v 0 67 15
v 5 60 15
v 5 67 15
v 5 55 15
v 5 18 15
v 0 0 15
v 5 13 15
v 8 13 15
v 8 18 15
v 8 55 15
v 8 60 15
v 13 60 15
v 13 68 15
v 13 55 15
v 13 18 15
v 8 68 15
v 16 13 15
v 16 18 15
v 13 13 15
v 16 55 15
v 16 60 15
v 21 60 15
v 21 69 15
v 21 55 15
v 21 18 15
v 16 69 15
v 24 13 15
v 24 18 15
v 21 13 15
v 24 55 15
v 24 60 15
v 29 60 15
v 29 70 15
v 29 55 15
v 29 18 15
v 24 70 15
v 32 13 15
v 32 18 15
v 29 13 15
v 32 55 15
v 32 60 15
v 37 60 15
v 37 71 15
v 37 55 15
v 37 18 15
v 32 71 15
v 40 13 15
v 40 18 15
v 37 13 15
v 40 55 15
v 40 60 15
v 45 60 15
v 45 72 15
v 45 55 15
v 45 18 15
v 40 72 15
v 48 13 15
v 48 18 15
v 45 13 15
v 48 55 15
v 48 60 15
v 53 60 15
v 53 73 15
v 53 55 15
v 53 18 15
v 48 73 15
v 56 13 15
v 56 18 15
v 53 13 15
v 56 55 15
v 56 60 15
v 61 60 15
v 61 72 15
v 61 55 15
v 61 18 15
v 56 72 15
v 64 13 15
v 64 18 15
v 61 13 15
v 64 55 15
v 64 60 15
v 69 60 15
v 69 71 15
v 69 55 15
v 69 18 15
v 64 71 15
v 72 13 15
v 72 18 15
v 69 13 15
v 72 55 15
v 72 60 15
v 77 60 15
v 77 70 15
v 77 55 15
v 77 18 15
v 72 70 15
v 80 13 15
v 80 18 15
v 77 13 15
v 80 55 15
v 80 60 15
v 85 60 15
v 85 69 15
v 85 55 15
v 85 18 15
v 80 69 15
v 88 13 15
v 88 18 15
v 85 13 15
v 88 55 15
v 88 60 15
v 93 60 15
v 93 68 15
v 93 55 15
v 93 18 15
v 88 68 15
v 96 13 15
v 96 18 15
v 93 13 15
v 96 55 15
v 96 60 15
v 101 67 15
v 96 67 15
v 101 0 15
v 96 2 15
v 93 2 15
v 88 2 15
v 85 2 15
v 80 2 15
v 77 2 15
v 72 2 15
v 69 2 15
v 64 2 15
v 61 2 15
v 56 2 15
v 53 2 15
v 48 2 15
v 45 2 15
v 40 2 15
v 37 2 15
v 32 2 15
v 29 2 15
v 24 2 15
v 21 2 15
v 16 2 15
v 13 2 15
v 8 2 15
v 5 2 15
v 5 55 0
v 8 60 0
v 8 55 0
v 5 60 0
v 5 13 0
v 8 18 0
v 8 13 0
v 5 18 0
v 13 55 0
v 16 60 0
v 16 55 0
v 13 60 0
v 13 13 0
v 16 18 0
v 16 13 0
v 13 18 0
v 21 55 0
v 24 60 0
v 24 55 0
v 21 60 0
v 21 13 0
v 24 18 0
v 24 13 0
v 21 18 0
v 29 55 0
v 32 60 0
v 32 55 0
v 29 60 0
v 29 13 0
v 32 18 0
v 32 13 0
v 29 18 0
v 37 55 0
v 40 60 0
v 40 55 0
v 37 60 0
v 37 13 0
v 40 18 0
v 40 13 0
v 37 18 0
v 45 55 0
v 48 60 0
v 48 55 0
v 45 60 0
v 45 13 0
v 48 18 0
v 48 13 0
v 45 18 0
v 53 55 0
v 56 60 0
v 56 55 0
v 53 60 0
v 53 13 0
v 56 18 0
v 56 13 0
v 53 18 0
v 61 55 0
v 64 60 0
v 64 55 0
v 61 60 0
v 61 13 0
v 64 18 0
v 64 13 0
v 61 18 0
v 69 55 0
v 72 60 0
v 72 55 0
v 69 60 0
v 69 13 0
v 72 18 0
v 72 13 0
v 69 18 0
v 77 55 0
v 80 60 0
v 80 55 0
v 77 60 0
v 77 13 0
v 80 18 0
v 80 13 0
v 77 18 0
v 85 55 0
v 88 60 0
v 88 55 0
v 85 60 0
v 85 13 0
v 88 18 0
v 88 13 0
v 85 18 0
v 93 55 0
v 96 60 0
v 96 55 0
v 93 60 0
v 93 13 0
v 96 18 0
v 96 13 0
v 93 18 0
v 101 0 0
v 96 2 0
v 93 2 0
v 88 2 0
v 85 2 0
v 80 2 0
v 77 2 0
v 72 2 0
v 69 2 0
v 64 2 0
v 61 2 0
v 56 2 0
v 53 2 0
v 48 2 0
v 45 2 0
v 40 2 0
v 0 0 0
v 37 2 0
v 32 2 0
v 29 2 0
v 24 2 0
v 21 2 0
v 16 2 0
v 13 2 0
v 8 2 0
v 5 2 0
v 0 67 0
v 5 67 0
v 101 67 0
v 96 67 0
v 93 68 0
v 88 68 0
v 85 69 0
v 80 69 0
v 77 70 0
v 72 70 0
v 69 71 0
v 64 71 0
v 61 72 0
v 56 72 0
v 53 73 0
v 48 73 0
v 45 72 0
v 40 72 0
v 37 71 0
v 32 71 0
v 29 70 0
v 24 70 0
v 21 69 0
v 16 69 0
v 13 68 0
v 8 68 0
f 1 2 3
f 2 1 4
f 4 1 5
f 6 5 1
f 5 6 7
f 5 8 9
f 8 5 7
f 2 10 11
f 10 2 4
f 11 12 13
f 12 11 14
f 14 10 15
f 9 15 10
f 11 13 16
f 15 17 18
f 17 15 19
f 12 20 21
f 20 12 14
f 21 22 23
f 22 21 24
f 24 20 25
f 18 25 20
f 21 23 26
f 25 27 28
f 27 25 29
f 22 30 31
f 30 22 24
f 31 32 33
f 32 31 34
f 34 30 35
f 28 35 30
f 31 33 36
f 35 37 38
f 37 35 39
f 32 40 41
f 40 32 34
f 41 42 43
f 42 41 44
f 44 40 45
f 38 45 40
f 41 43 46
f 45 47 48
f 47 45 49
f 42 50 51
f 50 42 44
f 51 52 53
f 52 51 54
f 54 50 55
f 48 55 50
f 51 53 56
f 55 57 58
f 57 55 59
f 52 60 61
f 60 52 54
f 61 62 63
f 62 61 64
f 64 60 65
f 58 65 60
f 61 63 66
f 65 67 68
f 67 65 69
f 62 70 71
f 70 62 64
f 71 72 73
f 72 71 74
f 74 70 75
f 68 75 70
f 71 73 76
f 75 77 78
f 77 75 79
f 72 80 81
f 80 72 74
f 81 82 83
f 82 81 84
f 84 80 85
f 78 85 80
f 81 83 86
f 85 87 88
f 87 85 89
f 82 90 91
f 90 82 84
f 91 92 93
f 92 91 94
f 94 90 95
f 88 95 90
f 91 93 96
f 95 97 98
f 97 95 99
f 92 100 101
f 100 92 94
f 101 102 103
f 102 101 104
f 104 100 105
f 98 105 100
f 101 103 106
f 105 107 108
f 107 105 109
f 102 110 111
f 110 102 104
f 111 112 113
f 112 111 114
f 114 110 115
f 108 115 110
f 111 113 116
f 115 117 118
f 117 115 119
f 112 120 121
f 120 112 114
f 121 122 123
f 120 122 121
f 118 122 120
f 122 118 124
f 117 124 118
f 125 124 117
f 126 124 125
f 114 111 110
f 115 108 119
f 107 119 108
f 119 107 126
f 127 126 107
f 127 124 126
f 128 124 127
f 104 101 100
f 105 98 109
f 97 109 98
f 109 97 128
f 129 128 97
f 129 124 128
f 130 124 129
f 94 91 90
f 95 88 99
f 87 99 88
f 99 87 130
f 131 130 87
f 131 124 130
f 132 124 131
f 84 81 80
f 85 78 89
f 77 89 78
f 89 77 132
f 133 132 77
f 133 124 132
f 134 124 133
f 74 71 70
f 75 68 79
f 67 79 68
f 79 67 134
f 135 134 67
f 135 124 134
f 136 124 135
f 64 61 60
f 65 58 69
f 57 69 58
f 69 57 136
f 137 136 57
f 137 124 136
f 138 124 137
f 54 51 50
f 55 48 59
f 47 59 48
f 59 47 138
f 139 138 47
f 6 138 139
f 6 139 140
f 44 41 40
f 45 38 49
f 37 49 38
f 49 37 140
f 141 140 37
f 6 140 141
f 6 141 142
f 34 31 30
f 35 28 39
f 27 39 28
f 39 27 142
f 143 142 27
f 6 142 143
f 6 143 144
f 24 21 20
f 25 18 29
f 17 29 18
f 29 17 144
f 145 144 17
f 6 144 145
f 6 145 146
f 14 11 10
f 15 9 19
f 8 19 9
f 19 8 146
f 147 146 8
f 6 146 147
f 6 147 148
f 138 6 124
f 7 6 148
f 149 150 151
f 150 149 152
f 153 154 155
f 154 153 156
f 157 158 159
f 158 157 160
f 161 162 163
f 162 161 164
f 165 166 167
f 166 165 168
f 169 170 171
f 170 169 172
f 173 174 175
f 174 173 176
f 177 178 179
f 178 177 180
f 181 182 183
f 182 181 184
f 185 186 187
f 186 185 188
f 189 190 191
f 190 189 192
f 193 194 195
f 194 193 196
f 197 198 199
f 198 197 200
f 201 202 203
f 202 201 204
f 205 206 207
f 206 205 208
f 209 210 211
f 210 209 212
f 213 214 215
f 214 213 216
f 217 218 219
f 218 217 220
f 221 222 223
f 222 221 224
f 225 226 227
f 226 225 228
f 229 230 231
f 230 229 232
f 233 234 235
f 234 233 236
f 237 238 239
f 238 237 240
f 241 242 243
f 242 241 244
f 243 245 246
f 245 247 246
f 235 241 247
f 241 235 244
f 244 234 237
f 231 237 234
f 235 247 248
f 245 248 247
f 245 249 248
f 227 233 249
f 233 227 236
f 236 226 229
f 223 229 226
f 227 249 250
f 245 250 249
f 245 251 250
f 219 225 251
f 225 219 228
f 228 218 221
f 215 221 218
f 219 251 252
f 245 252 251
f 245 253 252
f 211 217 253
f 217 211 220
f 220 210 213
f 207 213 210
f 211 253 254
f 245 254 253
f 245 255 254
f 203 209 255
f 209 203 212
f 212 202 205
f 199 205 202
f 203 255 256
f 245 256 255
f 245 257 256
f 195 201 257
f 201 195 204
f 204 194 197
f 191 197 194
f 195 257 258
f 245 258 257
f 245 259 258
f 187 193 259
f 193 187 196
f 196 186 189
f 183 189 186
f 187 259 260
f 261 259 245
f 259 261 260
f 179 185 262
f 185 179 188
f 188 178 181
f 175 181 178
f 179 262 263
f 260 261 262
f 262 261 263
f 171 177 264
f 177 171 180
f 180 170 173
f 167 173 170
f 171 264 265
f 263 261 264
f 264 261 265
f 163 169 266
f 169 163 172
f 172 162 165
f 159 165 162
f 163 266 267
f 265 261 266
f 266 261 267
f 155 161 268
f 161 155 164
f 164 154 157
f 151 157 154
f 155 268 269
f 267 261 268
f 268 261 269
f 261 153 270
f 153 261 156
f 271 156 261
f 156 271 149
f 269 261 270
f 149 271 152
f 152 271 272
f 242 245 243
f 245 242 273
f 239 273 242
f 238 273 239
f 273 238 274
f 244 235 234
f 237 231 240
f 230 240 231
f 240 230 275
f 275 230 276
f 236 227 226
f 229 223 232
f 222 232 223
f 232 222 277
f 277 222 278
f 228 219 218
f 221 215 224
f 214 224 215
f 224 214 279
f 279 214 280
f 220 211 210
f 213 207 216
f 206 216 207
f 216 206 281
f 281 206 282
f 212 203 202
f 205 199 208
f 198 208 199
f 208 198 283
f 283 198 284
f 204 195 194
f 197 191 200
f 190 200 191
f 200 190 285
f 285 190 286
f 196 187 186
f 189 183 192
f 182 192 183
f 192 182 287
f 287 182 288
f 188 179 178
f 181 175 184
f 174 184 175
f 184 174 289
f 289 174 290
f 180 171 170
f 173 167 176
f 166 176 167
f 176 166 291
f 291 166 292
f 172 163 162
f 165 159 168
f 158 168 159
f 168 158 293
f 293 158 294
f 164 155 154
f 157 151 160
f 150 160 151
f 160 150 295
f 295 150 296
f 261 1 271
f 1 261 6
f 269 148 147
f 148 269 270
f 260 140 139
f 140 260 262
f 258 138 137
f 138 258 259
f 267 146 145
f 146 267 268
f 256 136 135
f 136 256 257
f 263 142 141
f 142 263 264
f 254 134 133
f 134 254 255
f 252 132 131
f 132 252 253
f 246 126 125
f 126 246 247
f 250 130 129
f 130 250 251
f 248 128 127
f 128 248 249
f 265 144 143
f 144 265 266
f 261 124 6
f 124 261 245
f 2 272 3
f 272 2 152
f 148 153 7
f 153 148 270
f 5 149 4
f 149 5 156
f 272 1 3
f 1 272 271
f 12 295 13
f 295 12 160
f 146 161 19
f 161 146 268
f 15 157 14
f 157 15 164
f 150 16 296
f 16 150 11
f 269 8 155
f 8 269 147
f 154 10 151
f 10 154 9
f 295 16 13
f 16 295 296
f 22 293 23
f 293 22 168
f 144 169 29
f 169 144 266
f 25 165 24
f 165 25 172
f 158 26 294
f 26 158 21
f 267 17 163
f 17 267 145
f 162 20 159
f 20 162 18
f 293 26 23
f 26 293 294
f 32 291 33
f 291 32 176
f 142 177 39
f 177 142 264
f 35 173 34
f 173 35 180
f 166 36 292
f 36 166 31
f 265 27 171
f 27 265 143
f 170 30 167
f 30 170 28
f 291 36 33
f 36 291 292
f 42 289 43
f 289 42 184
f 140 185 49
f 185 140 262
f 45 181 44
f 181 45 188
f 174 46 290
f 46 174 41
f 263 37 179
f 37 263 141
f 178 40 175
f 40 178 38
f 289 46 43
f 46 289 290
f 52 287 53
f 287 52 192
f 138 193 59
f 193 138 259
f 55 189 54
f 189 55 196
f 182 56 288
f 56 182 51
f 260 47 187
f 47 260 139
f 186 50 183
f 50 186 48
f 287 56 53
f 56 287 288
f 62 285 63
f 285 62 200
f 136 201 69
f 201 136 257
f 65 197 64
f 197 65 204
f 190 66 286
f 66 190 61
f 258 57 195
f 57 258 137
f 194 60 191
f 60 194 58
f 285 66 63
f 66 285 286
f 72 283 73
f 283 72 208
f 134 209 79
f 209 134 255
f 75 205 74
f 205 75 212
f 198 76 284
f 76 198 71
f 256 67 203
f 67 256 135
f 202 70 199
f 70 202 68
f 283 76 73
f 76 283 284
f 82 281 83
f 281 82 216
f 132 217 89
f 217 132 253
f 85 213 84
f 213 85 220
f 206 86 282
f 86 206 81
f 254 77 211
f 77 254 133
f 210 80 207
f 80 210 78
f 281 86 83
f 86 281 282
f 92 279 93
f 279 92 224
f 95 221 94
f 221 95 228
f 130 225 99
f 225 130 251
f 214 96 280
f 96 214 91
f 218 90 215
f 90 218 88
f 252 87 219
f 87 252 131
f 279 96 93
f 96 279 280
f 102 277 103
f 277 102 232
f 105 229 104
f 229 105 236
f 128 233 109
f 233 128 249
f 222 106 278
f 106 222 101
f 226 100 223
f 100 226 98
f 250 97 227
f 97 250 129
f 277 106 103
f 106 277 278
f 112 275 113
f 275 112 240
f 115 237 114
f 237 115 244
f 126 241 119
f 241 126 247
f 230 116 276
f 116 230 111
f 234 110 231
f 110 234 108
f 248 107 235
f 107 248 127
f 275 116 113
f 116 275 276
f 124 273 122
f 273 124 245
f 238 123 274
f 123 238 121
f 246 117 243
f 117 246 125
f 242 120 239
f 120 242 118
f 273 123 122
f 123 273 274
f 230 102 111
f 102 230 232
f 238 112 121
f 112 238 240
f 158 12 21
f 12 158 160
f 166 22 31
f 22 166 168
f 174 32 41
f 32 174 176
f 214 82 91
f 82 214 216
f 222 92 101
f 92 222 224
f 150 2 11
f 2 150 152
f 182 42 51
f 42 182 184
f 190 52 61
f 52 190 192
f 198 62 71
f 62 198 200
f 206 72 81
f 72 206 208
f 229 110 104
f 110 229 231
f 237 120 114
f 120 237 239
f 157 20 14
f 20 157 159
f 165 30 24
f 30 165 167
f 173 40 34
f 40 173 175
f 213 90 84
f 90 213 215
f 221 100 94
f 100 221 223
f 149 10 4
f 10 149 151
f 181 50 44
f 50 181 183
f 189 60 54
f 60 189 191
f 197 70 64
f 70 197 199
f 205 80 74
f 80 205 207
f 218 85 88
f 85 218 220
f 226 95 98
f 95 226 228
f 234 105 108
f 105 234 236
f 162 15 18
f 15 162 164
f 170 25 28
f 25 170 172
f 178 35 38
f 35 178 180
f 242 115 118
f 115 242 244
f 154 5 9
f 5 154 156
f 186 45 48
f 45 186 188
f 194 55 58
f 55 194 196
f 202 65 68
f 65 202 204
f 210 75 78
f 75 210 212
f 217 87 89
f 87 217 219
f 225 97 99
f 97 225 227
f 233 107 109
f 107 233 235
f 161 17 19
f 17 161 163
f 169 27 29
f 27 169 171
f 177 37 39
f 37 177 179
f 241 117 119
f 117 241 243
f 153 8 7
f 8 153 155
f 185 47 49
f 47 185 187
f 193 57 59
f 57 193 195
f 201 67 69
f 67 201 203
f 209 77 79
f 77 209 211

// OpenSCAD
// Забор by @Karimov_Sheroz

cube([100, 2, 15]); color([0.1,0.4,0])  // параллелепипед со сторонами 100,2,15  мм
cube([100, 2, 15]); color([0.1,0.4,0])  // параллелепипед со сторонами 100,2,15  мм  
  translate([0,0,0]) cube([5, 67, 15]); color([0.56,0.23,0])  // параллелепипед со сторонами 5, 67, 15  мм
translate([8,0,0]) cube([5, 68, 15]); color([0.56,0.23,0])  //параллелепипед со сторонами 5, 68, 15  мм
translate([16,0,0]) cube([5, 69, 15]); color([0.56,0.23,0])  // параллелепипед со сторонами 5, 69, 15  мм 
translate([24,0,0]) cube([5, 70, 15]); color([0.56,0.23,0])  // параллелепипед со сторонами 5, 70, 15  мм  
translate([32,0,0]) cube([5, 71, 15]); color([0.56,0.23,0])   //параллелепипед со сторонами 5, 71, 15  мм
  translate([40,0,0]) cube([5, 72, 15]); color([0.56,0.23,0])   //параллелепипед со сторонами 5, 72, 15  мм
translate([48,0,0]) cube([5, 73, 15]); color([0.56,0.23,0])   //параллелепипед со сторонами 5, 73, 15  мм
 translate([56,0,0]) cube([5, 72, 15]); color([0.56,0.23,0])  //параллелепипед со сторонами 5, 72, 15  мм
 translate([64,0,0]) cube([5, 71, 15]); color([0.56,0.23,0])  //параллелепипед со сторонами 5, 71, 15  мм
translate([72,0,0]) cube([5, 70, 15]); color([0.56,0.23,0])  //параллелепипед со сторонами 5, 70, 15  мм 
translate([80,0,0]) cube([5, 69, 15]); color([0.56,0.23,0])  //параллелепипед со сторонами 5, 69, 15  мм
translate([88,0,0]) cube([5, 68, 15]); color([0.56,0.23,0])  //параллелепипед со сторонами 5, 68, 15  мм
translate([96,0,0]) cube([5, 67, 15]);  // параллелепипед со сторонами 5, 67, 15 мм 
cube([100, 2, 15]);  //параллелепипед со сторонами 100,2,15  мм
translate([0,55,0]) cube([100, 5, 15]);  //параллелепипед со сторонами 100,5,15  мм
cube([100, 2, 15]);
translate([0,13,0]) cube([100, 5, 15]);  //параллелепипед со сторонами 100,5,15  мм
